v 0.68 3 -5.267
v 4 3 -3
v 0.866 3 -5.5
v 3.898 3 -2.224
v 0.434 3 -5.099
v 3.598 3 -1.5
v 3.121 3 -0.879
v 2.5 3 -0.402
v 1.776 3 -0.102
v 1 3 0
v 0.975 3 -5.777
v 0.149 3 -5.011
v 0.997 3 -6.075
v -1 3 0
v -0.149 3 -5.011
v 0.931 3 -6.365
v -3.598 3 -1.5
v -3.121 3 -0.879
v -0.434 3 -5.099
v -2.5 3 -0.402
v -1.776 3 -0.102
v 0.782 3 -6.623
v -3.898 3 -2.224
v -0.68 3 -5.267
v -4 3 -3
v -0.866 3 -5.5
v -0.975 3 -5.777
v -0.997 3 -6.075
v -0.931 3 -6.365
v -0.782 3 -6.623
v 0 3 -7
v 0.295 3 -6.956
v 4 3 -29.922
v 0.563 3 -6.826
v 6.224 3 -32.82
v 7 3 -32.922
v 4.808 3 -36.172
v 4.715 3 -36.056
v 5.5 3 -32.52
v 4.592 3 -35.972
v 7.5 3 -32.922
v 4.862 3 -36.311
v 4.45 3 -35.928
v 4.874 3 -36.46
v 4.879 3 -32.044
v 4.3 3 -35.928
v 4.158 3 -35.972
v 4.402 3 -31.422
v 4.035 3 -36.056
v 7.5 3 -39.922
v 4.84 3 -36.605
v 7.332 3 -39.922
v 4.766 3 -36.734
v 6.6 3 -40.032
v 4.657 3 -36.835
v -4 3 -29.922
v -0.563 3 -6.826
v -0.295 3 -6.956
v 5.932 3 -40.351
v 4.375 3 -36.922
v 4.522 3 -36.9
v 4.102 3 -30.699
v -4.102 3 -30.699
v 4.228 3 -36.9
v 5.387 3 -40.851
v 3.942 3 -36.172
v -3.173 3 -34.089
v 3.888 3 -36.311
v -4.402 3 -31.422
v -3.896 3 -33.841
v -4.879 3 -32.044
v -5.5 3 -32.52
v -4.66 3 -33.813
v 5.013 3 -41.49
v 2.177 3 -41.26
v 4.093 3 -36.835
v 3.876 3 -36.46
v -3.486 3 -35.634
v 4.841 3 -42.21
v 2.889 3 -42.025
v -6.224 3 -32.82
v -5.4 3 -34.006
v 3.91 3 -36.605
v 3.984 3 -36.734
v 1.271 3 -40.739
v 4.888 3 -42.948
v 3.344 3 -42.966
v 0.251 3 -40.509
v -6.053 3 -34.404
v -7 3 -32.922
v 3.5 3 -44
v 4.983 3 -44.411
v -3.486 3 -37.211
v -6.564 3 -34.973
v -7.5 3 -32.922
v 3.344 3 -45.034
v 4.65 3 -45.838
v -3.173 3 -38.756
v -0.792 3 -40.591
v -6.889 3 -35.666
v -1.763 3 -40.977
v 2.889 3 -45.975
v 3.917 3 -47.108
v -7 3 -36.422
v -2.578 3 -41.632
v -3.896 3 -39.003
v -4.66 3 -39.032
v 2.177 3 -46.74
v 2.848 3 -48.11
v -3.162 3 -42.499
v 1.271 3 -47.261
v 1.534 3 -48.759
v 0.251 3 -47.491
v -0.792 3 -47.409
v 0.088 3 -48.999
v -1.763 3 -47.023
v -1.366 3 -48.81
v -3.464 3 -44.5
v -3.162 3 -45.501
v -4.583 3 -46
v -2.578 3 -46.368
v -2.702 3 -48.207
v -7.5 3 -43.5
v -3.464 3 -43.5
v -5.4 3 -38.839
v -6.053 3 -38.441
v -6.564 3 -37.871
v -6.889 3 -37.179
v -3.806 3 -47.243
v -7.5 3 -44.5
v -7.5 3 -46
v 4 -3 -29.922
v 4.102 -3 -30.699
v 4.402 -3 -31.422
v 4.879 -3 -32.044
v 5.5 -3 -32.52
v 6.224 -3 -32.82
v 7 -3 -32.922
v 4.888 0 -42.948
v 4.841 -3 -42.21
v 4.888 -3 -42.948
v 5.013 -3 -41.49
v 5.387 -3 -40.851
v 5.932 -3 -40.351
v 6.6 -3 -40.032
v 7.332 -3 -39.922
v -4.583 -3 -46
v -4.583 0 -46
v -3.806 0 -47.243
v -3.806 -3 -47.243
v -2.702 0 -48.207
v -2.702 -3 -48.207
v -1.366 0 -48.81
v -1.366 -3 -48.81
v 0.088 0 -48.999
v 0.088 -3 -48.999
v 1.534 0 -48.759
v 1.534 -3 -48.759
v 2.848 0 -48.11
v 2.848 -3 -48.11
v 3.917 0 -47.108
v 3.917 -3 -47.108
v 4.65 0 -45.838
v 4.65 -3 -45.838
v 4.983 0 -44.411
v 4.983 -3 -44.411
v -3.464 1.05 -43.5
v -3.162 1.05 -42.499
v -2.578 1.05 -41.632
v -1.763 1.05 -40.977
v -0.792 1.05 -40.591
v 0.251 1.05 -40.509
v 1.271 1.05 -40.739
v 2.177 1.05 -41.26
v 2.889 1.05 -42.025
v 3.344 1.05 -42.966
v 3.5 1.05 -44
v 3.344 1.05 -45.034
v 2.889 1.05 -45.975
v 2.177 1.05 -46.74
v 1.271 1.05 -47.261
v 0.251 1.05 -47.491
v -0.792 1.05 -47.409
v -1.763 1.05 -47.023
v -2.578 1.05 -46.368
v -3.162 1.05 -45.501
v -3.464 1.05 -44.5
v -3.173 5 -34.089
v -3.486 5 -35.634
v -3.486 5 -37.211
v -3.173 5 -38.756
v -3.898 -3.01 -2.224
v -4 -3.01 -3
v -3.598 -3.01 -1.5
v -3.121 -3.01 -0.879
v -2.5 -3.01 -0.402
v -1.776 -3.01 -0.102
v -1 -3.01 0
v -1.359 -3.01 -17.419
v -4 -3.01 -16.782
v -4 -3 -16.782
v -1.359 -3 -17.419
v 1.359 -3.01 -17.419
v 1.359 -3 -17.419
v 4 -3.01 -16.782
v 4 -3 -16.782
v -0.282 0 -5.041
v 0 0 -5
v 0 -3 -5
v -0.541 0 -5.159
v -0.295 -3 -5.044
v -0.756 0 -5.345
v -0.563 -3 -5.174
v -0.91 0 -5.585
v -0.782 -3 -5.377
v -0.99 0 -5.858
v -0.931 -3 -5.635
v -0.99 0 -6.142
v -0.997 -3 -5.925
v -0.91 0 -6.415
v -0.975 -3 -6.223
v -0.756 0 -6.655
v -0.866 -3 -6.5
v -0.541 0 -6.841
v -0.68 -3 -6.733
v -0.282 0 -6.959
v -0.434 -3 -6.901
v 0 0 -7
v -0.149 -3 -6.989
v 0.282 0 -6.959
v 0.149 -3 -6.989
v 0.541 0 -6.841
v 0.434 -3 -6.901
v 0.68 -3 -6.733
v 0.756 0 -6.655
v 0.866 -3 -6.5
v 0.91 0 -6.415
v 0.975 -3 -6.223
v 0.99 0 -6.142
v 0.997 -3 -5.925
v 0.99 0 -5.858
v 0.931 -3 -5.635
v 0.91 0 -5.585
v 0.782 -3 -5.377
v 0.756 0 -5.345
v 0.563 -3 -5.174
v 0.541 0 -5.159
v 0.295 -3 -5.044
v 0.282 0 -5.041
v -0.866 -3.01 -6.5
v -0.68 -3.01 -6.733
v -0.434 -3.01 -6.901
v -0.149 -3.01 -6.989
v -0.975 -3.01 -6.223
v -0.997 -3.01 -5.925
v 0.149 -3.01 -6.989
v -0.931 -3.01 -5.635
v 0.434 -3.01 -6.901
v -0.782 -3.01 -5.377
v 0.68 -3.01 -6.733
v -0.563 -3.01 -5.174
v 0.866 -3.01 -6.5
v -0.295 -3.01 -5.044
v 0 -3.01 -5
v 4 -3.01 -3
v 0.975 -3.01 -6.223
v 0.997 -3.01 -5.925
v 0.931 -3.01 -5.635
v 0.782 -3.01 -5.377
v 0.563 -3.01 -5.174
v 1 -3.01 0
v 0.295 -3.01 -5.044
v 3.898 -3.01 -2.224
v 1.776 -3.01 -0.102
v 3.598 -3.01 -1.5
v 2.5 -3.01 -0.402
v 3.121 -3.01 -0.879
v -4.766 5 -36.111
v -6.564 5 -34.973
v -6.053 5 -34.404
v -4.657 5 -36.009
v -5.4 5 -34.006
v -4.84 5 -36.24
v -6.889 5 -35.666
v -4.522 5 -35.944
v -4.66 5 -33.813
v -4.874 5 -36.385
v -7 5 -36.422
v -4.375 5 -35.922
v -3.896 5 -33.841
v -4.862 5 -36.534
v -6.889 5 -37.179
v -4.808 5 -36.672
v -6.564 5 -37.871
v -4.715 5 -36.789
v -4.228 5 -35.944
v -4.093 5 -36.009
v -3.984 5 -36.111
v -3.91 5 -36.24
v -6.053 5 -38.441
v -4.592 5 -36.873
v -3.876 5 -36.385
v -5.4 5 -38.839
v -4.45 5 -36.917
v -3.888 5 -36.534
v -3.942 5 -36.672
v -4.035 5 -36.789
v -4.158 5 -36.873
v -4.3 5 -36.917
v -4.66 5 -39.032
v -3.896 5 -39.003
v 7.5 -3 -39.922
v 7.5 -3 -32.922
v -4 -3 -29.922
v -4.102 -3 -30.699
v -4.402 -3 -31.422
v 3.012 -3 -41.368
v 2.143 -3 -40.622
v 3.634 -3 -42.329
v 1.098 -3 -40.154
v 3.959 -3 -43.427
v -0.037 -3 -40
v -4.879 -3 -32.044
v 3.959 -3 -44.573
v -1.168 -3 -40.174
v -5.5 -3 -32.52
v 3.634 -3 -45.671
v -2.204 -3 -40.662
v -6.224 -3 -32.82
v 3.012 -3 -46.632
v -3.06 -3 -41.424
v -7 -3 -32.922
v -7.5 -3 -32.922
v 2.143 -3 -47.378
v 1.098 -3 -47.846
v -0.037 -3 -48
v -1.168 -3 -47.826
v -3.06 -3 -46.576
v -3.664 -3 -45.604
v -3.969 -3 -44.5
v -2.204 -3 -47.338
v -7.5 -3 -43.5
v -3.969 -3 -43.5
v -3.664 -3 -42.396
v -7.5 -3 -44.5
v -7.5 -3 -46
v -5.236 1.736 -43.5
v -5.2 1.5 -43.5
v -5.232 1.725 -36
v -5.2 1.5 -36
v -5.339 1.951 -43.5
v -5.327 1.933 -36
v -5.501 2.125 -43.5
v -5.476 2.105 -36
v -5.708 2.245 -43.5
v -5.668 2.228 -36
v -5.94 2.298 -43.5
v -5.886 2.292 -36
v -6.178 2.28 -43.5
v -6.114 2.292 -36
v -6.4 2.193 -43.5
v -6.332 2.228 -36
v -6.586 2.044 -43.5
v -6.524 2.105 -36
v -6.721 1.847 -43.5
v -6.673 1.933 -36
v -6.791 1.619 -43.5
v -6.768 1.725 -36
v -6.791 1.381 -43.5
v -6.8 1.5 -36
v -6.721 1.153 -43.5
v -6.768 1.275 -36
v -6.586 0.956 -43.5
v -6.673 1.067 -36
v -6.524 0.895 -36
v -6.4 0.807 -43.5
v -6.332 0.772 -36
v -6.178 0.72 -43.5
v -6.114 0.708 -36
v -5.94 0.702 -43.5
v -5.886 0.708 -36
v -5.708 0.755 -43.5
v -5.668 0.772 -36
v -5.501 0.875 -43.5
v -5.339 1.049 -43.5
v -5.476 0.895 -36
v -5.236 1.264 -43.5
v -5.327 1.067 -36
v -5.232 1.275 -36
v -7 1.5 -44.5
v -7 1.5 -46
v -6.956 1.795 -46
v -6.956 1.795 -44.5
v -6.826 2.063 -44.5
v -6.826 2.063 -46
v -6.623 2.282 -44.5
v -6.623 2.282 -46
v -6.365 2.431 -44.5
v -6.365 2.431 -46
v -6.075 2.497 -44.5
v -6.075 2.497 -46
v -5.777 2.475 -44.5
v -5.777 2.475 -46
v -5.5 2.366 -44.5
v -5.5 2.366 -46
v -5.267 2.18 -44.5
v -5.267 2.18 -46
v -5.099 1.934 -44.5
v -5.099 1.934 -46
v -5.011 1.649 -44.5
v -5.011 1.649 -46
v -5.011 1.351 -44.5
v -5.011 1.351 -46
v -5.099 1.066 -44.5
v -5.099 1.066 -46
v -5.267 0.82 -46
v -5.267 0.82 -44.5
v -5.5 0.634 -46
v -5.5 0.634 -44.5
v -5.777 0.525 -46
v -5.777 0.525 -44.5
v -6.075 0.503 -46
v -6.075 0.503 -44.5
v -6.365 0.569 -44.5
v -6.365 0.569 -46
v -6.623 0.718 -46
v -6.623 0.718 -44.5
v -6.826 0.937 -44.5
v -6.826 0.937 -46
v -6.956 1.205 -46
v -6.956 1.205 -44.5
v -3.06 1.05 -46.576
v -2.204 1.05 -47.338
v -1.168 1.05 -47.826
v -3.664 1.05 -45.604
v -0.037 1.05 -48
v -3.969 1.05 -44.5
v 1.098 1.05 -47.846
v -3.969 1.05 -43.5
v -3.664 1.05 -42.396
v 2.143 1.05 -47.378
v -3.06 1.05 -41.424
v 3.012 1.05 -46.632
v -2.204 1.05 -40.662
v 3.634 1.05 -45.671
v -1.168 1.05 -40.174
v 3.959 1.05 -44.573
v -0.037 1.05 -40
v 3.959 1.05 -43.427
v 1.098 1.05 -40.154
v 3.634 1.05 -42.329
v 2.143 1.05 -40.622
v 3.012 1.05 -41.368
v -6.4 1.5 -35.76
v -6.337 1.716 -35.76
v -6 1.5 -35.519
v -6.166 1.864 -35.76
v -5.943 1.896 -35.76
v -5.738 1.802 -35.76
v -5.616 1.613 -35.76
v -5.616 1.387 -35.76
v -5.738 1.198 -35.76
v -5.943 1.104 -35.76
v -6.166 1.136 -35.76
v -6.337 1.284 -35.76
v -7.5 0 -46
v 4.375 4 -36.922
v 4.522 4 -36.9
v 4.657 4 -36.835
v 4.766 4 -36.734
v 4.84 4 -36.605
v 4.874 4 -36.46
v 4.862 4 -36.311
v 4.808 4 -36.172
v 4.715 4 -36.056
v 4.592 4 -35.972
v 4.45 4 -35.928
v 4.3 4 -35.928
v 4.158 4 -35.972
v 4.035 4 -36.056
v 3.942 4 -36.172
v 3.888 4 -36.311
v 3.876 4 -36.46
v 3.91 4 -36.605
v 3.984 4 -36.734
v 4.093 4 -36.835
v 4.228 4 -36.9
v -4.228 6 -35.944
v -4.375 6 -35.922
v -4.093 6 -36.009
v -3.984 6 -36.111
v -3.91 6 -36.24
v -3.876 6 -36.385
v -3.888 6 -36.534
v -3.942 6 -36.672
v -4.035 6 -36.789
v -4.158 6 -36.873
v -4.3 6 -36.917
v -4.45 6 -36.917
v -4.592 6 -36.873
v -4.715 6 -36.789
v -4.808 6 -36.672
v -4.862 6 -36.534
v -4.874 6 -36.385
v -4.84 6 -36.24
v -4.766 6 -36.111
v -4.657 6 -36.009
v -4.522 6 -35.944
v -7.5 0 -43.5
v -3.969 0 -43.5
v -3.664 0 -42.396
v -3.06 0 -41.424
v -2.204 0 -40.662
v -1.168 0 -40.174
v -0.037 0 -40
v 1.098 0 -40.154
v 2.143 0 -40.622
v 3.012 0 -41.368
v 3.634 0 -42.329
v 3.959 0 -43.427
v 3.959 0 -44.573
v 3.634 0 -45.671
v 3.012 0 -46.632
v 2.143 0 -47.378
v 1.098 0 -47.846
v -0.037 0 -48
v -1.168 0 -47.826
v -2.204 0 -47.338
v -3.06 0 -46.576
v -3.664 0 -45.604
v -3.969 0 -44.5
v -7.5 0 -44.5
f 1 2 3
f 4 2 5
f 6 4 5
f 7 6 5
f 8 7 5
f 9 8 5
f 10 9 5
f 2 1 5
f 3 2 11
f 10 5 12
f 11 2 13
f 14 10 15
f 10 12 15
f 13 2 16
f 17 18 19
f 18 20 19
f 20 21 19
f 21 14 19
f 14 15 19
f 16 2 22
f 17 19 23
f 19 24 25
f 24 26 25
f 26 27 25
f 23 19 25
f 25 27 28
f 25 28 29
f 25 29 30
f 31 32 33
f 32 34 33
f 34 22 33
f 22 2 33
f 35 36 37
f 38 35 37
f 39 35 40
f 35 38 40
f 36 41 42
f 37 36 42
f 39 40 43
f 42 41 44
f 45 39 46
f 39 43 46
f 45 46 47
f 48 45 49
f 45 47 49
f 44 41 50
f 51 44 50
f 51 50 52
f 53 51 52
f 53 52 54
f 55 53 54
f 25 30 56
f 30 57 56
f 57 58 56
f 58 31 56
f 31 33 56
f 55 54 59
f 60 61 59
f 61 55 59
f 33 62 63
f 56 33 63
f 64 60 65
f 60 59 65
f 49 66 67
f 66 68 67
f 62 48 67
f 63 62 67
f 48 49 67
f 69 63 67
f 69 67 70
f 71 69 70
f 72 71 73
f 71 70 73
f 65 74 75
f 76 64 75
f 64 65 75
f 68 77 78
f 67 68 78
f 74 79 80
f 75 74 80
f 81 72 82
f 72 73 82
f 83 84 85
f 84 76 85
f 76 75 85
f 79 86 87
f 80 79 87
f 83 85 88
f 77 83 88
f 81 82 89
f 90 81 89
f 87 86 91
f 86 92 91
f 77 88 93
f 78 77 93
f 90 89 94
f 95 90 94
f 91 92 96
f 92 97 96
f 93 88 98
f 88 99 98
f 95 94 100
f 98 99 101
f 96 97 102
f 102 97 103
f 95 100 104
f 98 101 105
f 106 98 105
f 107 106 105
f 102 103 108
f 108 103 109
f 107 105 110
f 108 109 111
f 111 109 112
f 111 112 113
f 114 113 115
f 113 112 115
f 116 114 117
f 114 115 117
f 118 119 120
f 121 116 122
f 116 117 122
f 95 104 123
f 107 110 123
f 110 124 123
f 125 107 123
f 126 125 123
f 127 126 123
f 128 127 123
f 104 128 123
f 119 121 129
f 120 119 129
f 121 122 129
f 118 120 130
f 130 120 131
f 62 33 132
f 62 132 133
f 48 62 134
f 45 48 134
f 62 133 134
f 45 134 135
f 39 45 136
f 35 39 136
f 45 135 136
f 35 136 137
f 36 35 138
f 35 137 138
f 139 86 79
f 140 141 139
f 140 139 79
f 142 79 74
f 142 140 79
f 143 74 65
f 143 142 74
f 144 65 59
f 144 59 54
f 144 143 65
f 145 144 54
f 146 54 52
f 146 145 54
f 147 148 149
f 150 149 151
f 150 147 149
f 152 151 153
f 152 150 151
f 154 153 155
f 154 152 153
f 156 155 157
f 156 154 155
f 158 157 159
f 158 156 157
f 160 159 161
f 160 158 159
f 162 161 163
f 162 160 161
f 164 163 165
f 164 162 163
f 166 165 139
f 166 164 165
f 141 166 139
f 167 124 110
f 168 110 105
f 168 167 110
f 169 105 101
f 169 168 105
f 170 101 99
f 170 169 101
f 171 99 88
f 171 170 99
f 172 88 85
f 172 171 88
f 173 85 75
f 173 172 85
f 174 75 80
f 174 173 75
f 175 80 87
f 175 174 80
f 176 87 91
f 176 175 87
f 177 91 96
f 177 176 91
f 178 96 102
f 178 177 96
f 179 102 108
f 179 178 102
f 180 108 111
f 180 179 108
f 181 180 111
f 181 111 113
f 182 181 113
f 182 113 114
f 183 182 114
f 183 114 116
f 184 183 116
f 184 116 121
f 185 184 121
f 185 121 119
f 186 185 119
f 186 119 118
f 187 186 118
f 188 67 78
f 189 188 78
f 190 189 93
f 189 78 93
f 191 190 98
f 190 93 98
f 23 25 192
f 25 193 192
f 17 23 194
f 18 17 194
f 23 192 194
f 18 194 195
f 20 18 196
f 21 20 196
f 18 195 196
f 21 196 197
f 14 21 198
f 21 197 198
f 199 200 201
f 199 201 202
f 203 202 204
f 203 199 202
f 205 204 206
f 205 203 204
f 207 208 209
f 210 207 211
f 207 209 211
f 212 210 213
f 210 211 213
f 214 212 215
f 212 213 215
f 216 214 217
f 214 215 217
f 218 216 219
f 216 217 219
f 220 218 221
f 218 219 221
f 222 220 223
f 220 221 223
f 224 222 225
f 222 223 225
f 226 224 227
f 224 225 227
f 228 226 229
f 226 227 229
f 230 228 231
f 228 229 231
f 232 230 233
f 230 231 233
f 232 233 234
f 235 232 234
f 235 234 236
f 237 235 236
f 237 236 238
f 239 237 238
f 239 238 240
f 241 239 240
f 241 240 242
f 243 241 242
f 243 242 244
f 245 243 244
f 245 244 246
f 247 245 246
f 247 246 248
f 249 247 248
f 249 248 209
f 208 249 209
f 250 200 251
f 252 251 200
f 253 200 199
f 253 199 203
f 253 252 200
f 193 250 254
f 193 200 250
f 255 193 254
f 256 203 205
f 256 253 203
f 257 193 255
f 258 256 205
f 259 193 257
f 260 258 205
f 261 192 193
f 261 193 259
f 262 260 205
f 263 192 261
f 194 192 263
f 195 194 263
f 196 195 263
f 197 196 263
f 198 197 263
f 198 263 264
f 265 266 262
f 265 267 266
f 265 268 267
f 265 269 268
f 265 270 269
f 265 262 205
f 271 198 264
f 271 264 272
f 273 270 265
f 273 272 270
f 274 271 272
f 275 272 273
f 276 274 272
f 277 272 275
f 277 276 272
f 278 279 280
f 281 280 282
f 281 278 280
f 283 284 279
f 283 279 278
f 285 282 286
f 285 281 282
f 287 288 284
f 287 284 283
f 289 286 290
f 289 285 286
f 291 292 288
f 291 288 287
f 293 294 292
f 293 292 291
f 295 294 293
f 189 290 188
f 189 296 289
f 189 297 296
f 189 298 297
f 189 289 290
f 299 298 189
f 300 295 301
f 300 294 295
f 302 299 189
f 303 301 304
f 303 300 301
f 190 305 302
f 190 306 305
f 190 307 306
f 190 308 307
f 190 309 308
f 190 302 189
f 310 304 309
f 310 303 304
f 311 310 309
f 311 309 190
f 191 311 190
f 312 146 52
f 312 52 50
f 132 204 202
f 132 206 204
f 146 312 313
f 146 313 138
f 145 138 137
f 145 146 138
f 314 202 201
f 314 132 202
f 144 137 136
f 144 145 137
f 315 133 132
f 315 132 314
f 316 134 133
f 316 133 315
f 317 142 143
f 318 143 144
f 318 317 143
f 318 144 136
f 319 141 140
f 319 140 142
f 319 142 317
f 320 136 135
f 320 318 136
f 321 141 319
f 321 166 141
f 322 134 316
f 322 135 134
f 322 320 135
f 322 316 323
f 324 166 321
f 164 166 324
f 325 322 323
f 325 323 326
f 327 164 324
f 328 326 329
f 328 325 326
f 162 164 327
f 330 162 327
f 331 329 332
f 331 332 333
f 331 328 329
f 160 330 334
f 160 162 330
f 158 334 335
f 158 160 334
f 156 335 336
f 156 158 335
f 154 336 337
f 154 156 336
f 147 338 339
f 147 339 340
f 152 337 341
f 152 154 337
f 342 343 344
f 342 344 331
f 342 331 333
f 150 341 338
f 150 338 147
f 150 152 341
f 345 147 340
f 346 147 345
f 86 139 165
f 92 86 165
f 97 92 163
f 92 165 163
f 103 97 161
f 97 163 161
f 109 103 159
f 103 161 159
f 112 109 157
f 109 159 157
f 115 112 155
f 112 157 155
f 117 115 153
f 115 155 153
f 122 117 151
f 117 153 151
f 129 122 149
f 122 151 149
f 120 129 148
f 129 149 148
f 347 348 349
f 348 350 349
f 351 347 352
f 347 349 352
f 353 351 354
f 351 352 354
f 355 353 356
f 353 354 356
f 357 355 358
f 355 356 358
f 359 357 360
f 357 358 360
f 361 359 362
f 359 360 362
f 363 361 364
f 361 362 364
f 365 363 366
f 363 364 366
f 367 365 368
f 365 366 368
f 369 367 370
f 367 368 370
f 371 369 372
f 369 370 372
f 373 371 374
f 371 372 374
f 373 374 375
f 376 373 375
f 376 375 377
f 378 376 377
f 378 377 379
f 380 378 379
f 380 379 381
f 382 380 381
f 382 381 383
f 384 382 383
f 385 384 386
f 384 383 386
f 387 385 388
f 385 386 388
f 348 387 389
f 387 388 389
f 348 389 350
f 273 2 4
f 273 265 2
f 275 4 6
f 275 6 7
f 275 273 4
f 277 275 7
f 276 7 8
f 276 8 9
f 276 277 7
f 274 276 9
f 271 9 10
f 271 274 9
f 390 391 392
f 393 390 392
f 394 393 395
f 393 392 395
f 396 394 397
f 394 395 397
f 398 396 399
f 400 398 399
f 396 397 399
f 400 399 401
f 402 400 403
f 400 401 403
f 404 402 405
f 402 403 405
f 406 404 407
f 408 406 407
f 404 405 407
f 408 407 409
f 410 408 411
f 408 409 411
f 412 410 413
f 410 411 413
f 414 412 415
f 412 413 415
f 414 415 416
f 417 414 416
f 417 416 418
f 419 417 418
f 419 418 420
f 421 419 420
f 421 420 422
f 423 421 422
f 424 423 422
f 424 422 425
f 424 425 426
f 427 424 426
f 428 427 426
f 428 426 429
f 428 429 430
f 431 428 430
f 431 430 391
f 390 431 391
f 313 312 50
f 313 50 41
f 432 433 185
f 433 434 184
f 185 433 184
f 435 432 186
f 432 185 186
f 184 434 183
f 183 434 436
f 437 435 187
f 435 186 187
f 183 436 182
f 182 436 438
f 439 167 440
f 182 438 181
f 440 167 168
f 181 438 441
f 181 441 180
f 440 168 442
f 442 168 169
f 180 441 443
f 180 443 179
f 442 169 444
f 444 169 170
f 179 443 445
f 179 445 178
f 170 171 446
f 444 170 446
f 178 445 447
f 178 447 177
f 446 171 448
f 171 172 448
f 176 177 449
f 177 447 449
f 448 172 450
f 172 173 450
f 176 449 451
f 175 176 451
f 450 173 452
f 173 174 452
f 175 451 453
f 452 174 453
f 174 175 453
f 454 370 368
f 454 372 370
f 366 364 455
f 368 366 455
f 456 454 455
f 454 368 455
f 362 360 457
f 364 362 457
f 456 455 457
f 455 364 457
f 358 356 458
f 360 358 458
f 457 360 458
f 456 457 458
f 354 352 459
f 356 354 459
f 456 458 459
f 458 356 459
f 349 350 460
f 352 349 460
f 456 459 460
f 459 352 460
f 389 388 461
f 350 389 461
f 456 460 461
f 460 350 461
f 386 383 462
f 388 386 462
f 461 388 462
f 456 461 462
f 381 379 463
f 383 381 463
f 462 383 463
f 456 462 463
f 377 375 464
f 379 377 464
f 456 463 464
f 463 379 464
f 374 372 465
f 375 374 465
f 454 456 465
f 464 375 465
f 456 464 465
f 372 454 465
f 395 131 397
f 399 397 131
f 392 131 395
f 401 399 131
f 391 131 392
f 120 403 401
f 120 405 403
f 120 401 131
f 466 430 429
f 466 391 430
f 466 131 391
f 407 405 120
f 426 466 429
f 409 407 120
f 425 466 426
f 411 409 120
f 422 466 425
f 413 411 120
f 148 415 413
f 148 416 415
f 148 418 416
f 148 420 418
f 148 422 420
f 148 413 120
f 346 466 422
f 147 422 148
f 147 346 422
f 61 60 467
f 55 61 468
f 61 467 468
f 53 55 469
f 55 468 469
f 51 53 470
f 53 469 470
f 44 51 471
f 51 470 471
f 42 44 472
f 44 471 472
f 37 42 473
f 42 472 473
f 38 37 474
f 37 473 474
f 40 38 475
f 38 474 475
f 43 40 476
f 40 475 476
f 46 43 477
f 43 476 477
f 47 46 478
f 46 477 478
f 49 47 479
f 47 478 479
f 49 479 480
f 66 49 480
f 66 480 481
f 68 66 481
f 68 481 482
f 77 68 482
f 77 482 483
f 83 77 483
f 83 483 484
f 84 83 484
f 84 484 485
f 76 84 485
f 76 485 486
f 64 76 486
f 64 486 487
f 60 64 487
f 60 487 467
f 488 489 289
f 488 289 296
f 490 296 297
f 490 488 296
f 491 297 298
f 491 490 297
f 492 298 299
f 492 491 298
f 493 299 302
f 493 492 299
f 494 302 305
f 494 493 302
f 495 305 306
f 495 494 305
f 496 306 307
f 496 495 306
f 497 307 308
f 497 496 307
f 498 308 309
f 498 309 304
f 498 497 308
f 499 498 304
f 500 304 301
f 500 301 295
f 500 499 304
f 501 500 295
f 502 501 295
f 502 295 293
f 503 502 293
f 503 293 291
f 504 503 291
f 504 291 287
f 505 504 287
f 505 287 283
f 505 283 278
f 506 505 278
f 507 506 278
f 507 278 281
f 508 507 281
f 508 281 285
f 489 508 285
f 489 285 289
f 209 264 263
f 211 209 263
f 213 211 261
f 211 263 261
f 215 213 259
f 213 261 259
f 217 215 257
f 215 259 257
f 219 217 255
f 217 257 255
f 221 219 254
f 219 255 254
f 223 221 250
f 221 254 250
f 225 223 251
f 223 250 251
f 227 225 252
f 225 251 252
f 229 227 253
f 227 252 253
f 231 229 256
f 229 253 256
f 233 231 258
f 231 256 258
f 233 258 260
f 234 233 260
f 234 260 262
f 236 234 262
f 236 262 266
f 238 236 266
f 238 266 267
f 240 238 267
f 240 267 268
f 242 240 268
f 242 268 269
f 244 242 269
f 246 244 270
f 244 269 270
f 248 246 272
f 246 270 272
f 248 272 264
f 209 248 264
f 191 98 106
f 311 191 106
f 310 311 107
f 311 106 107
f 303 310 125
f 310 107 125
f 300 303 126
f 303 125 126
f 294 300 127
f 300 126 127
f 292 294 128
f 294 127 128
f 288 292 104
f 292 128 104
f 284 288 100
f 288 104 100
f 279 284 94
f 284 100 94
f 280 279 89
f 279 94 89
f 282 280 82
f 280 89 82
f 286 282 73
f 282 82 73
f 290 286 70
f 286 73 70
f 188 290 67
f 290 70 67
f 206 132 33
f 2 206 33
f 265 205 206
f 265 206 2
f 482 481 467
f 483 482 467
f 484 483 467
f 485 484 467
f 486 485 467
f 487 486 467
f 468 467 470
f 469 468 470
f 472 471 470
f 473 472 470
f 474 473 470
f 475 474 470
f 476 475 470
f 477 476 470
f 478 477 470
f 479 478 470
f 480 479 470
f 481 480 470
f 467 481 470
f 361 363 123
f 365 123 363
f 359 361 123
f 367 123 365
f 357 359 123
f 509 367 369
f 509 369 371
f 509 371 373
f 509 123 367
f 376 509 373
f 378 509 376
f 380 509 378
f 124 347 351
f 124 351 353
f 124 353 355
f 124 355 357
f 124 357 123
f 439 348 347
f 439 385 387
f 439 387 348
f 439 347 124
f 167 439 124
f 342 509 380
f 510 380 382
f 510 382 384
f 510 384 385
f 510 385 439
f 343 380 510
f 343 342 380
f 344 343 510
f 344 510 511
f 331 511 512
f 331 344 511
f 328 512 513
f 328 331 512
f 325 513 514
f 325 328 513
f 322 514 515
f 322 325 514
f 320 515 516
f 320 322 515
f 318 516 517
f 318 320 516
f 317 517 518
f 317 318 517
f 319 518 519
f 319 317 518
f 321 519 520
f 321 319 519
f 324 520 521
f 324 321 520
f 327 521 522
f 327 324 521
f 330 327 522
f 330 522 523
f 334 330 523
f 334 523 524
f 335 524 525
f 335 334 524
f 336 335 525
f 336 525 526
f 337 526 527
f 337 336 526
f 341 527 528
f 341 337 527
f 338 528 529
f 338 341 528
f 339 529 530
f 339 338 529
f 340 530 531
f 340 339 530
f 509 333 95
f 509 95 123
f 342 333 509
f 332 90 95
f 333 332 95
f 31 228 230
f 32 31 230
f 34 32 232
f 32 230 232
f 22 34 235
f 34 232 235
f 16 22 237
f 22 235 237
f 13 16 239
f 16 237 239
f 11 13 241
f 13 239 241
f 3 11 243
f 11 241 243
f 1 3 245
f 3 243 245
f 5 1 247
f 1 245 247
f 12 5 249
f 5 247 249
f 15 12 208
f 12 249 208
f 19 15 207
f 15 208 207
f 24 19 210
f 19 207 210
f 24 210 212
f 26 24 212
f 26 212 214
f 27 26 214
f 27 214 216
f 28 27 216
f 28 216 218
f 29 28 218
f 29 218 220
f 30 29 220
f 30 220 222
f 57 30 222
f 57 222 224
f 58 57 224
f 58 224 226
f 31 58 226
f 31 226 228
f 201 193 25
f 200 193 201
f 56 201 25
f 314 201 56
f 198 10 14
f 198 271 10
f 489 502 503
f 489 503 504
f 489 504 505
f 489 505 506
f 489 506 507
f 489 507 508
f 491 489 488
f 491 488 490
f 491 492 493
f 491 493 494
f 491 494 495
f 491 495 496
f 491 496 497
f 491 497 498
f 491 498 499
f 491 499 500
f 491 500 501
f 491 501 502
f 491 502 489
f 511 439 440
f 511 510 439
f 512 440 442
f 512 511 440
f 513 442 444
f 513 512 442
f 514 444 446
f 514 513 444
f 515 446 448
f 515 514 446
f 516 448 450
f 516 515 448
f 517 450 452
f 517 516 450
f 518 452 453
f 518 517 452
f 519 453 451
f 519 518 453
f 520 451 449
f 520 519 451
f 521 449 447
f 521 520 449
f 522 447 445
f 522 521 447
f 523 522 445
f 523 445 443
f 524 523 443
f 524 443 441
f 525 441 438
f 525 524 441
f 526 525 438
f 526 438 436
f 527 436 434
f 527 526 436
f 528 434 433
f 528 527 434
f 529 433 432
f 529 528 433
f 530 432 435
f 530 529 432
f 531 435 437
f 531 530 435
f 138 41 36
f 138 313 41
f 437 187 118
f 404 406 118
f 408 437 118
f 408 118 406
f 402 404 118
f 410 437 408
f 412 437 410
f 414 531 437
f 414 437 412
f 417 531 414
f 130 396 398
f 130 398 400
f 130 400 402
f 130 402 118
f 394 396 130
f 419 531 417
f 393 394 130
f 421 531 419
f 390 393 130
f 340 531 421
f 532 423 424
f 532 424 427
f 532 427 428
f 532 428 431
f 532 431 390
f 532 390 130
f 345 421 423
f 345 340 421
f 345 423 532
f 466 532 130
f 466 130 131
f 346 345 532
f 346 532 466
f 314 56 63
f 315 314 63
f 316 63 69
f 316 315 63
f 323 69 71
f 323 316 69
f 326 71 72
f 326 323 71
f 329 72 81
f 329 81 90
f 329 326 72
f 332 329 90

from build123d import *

# Parameters (mm, degrees)
BASEARM_W             = 8
BASEARM_H             = 40
BOSS_EXTRUDE1_DEPTH   = 3
SKETCH2_R             = 5
SKETCH2_R_2           = 4
BOSS_EXTRUDE2_DEPTH   = 3
BOSS_EXTRUDE3_REACH   = 42.423
SKETCH3_W             = 1
SKETCH3_H             = 3
F_2_0MM_DOWEL_HOLE3_D = 2
SKETCH13_W            = 15
SKETCH13_H            = 7
SKETCH13_R            = 0.5
BOSS_EXTRUDE7_DEPTH   = 3
SKETCH15_W            = 3.5
SKETCH15_H            = 6.077722283
BOSS_EXTRUDE8_DEPTH   = 3
BOSS_EXTRUDE9_START   = -1.95
SKETCH20_R            = 4
SKETCH20_R_2          = 3.5
BOSS_EXTRUDE9_DEPTH   = 1.95
SKETCH16_W            = 4.035898385
SKETCH16_H            = 1
CUT_EXTRUDE5_DEPTH    = 3
BOSS_EXTRUDE10_START  = -4
SKETCH21_R            = 0.5
BOSS_EXTRUDE10_DEPTH  = 4
BOSS_EXTRUDE11_START  = 2
SKETCH22_R            = 0.5
BOSS_EXTRUDE11_DEPTH  = 2
BOSS_EXTRUDE12_DEPTH  = 2
M2_TAPPED_HOLE1_D     = 1.6
M2_TAPPED_HOLE1_DEPTH = 10
M2_TAPPED_HOLE1_TIP   = 0.480688495
CUT_EXTRUDE6_REACH    = 48.992
SKETCH28_R            = 1
BOSS_EXTRUDE13_START  = 3
SKETCH29_R            = 1
BOSS_EXTRUDE13_DEPTH  = 3
BOSS_EXTRUDE14_START  = 0.01
SKETCH30_R            = 1
BOSS_EXTRUDE14_DEPTH  = 0.01
FILLET3_R             = 3
BOSS_EXTRUDE15_START  = -6
BOSS_EXTRUDE15_DEPTH  = 6


with BuildPart() as part:
    # BaseArm → Boss-Extrude1 (new body)
    with BuildSketch(Plane(origin=(0, 0, 0), x_dir=(1, 0, 0), z_dir=(0, 1, 0))):
        with Locations((0, 20)):
            Rectangle(BASEARM_W, BASEARM_H)
    extrude(amount=BOSS_EXTRUDE1_DEPTH)

    # Sketch2 → Boss-Extrude2 (add)
    with BuildSketch(Plane(origin=(0, 0, 0), x_dir=(1, 0, 0), z_dir=(0, 1, 0))):
        with Locations((0, 44)):
            Circle(SKETCH2_R)
        with Locations(Location((0, 44, 0), (0, 0, 270))):
            Circle(SKETCH2_R_2, mode=Mode.SUBTRACT)
    extrude(amount=BOSS_EXTRUDE2_DEPTH)

    # Sketch3 → Boss-Extrude3 (add, up to next)
    with BuildSketch(Plane(origin=(0, 0, -40), x_dir=(-1, 0, 0), z_dir=(0, 0, -1)), mode=Mode.PRIVATE) as boss_extrude3_sk1:
        with Locations((-3.5, 1.5)):
            Rectangle(SKETCH3_W, SKETCH3_H)
    boss_extrude3_tool1 = extrude(boss_extrude3_sk1.sketch, amount=BOSS_EXTRUDE3_REACH, mode=Mode.PRIVATE) - part.part
    # Sketch3 → Boss-Extrude3 (add, up to next)
    with BuildSketch(Plane(origin=(0, 0, -40), x_dir=(-1, 0, 0), z_dir=(0, 0, -1)), mode=Mode.PRIVATE) as boss_extrude3_sk2:
        with Locations((3.5, 1.5)):
            Rectangle(SKETCH3_W, SKETCH3_H)
    boss_extrude3_tool2 = extrude(boss_extrude3_sk2.sketch, amount=BOSS_EXTRUDE3_REACH, mode=Mode.PRIVATE) - part.part
    add(boss_extrude3_tool1.solids().sort_by_distance((3.5, 1.5, -40))[0])
    add(boss_extrude3_tool2.solids().sort_by_distance((-3.5, 1.5, -40))[0])

    # Ø2.0mm Dowel Hole3 (through all)
    with Locations(Plane(origin=(0, 3, -6), x_dir=(0, 0, 1), z_dir=(0, 1, 0))):
        with Locations((0, 0)):
            Hole(F_2_0MM_DOWEL_HOLE3_D / 2)

    # Sketch13 → Boss-Extrude7 (add)
    with BuildSketch(Plane(origin=(0, 3, 0), x_dir=(1, 0, 0), z_dir=(0, 1, 0))):
        with Locations((0, 36.422277717)):
            Rectangle(SKETCH13_W, SKETCH13_H)
        with Locations((-4.375, 36.422277717)):
            Circle(SKETCH13_R, mode=Mode.SUBTRACT)
        with Locations((4.375, 36.422277717)):
            Circle(SKETCH13_R, mode=Mode.SUBTRACT)
    extrude(amount=-BOSS_EXTRUDE7_DEPTH)

    # Sketch15 → Boss-Extrude8 (add)
    with BuildSketch(Plane(origin=(0, 3, 0), x_dir=(1, 0, 0), z_dir=(0, 1, 0))):
        with Locations((-5.75, 42.961138859)):
            Rectangle(SKETCH15_W, SKETCH15_H)
    extrude(amount=-BOSS_EXTRUDE8_DEPTH)

    # Sketch20 → Boss-Extrude9 (add)
    with BuildSketch(Plane(origin=(0, 3, 0), x_dir=(1, 0, 0), z_dir=(0, 1, 0)).offset(BOSS_EXTRUDE9_START)):
        with Locations(Location((0, 44, 0), (0, 0, 270))):
            Circle(SKETCH20_R)
        with Locations(Location((0, 44, 0), (0, 0, 270))):
            Circle(SKETCH20_R_2, mode=Mode.SUBTRACT)
    extrude(amount=BOSS_EXTRUDE9_DEPTH)

    # Sketch16 → Cut-Extrude5 (cut)
    with BuildSketch(Plane(origin=(0, 3, 0), x_dir=(1, 0, 0), z_dir=(0, 1, 0))):
        with Locations((-5.482050808, 44)):
            Rectangle(SKETCH16_W, SKETCH16_H)
    extrude(amount=-CUT_EXTRUDE5_DEPTH, mode=Mode.SUBTRACT)

    # Sketch21 → Boss-Extrude10 (add)
    with BuildSketch(Plane.XZ.offset(BOSS_EXTRUDE10_START)):
        with Locations(Location((-4.375, -36.422277717, 0), (0, 0, 270))):
            Circle(SKETCH21_R)
        with Locations(Location((4.375, -36.422277717, 0), (0, 0, 270))):
            Circle(SKETCH21_R)
    extrude(amount=BOSS_EXTRUDE10_DEPTH)

    # Sketch22 → Boss-Extrude11 (add)
    with BuildSketch(Plane(origin=(0, 4, 0), x_dir=(1, 0, 0), z_dir=(0, 1, 0)).offset(BOSS_EXTRUDE11_START)):
        with Locations(Location((-4.375, 36.422277717, 0), (0, 0, 270))):
            Circle(SKETCH22_R)
    extrude(amount=-BOSS_EXTRUDE11_DEPTH)

    # Sketch23 → Boss-Extrude12 (add)
    with BuildSketch(Plane(origin=(0, 3, 0), x_dir=(1, 0, 0), z_dir=(0, 1, 0))):
        with BuildLine():
            ThreePointArc((-3.172535714, 38.755666806), (-7, 36.422277717), (-3.172535714, 34.088888628))
            ThreePointArc((-3.172535714, 34.088888628), (-3.525, 36.422277717), (-3.172535714, 38.755666806))
        make_face()
    extrude(amount=BOSS_EXTRUDE12_DEPTH)

    # M2 Tapped Hole1
    with Locations(Plane(origin=(0, 0, -46), x_dir=(-1, 0, 0), z_dir=(0, 0, -1))):
        with Locations((6, 1.5)):
            Hole(M2_TAPPED_HOLE1_D / 2, depth=M2_TAPPED_HOLE1_DEPTH)
            with Locations((0, 0, -(M2_TAPPED_HOLE1_DEPTH + M2_TAPPED_HOLE1_TIP / 2))):  # 118° drill point
                Cone(0, M2_TAPPED_HOLE1_D / 2, M2_TAPPED_HOLE1_TIP, mode=Mode.SUBTRACT)

    # Sketch28 → Cut-Extrude6 (cut, up to next)
    with BuildSketch(Plane(origin=(0, 0, -46), x_dir=(-1, 0, 0), z_dir=(0, 0, -1)), mode=Mode.PRIVATE) as cut_extrude6_sk1:
        with Locations((6, 1.5)):
            Circle(SKETCH28_R)
    cut_extrude6_tool1 = extrude(cut_extrude6_sk1.sketch, amount=-CUT_EXTRUDE6_REACH, mode=Mode.PRIVATE) & part.part
    add(cut_extrude6_tool1.solids().sort_by_distance((-6, 1.5, -46))[0], mode=Mode.SUBTRACT)

    # Sketch29 → Boss-Extrude13 (add)
    with BuildSketch(Plane.XZ.offset(BOSS_EXTRUDE13_START)):
        with BuildLine():
            Line((4, -41), (4, -39.922277717))
            Line((4, -39.922277717), (7.5, -39.922277717))
            Line((7.5, -39.922277717), (7.5, -32.922277717))
            Line((7.5, -32.922277717), (4, -32.922277717))
            Line((4, -32.922277717), (4, 0))
            Line((4, 0), (-4, 0))
            Line((-4, 0), (-4, -32.922277717))
            Line((-4, -32.922277717), (-7.5, -32.922277717))
            Line((-7.5, -32.922277717), (-7.5, -43.5))
            Line((-7.5, -43.5), (-3.968626967, -43.5))
            ThreePointArc((-3.968626967, -43.5), (4, -44), (-3.968626967, -44.5))
            Line((-3.968626967, -44.5), (-7.5, -44.5))
            Line((-7.5, -44.5), (-7.5, -46))
            Line((-7.5, -46), (-4.582575695, -46))
            ThreePointArc((-4.582575695, -46), (2.516912515, -48.320318436), (4, -41))
        make_face()
        with Locations(Location((0, -6, 0), (0, 0, 90))):
            Circle(SKETCH29_R, mode=Mode.SUBTRACT)
    extrude(amount=-BOSS_EXTRUDE13_DEPTH)

    # Sketch30 → Boss-Extrude14 (add)
    with BuildSketch(Plane.XZ.offset(3).offset(BOSS_EXTRUDE14_START)):
        with BuildLine():
            Line((4, -16.781929326), (4, 0))
            Line((4, 0), (-4, 0))
            Line((-4, 0), (-4, -16.781929326))
            ThreePointArc((-4, -16.781929326), (0, -17.5), (4, -16.781929326))
        make_face()
        with Locations(Location((0, -6, 0), (0, 0, 90))):
            Circle(SKETCH30_R, mode=Mode.SUBTRACT)
    extrude(amount=-BOSS_EXTRUDE14_DEPTH)

    # Fillet3
    fillet3_edges = [part.edges().sort_by_distance(p)[0] for p in [
        (-4, 0, -32.922277717),
        (4, 0, -32.922277717),
        (4, -0.005, 0),
        (-4, -0.005, 0),
    ]]
    fillet(fillet3_edges, radius=FILLET3_R)

    # Sketch31 → Boss-Extrude15 (add)
    with BuildSketch(Plane(origin=(0, 3, 0), x_dir=(1, 0, 0), z_dir=(0, 1, 0)).offset(BOSS_EXTRUDE15_START)):
        with BuildLine():
            Line((7.332175148, 39.922277717), (4, 39.922277717))
            Line((4, 39.922277717), (4, 41))
            ThreePointArc((4, 41), (4.549561654, 41.925996926), (4.888116765, 42.948185145))
            ThreePointArc((4.888116765, 42.948185145), (5.387339863, 40.851413077), (7.332175148, 39.922277717))
        make_face()
    extrude(amount=BOSS_EXTRUDE15_DEPTH)


solid = part.part
